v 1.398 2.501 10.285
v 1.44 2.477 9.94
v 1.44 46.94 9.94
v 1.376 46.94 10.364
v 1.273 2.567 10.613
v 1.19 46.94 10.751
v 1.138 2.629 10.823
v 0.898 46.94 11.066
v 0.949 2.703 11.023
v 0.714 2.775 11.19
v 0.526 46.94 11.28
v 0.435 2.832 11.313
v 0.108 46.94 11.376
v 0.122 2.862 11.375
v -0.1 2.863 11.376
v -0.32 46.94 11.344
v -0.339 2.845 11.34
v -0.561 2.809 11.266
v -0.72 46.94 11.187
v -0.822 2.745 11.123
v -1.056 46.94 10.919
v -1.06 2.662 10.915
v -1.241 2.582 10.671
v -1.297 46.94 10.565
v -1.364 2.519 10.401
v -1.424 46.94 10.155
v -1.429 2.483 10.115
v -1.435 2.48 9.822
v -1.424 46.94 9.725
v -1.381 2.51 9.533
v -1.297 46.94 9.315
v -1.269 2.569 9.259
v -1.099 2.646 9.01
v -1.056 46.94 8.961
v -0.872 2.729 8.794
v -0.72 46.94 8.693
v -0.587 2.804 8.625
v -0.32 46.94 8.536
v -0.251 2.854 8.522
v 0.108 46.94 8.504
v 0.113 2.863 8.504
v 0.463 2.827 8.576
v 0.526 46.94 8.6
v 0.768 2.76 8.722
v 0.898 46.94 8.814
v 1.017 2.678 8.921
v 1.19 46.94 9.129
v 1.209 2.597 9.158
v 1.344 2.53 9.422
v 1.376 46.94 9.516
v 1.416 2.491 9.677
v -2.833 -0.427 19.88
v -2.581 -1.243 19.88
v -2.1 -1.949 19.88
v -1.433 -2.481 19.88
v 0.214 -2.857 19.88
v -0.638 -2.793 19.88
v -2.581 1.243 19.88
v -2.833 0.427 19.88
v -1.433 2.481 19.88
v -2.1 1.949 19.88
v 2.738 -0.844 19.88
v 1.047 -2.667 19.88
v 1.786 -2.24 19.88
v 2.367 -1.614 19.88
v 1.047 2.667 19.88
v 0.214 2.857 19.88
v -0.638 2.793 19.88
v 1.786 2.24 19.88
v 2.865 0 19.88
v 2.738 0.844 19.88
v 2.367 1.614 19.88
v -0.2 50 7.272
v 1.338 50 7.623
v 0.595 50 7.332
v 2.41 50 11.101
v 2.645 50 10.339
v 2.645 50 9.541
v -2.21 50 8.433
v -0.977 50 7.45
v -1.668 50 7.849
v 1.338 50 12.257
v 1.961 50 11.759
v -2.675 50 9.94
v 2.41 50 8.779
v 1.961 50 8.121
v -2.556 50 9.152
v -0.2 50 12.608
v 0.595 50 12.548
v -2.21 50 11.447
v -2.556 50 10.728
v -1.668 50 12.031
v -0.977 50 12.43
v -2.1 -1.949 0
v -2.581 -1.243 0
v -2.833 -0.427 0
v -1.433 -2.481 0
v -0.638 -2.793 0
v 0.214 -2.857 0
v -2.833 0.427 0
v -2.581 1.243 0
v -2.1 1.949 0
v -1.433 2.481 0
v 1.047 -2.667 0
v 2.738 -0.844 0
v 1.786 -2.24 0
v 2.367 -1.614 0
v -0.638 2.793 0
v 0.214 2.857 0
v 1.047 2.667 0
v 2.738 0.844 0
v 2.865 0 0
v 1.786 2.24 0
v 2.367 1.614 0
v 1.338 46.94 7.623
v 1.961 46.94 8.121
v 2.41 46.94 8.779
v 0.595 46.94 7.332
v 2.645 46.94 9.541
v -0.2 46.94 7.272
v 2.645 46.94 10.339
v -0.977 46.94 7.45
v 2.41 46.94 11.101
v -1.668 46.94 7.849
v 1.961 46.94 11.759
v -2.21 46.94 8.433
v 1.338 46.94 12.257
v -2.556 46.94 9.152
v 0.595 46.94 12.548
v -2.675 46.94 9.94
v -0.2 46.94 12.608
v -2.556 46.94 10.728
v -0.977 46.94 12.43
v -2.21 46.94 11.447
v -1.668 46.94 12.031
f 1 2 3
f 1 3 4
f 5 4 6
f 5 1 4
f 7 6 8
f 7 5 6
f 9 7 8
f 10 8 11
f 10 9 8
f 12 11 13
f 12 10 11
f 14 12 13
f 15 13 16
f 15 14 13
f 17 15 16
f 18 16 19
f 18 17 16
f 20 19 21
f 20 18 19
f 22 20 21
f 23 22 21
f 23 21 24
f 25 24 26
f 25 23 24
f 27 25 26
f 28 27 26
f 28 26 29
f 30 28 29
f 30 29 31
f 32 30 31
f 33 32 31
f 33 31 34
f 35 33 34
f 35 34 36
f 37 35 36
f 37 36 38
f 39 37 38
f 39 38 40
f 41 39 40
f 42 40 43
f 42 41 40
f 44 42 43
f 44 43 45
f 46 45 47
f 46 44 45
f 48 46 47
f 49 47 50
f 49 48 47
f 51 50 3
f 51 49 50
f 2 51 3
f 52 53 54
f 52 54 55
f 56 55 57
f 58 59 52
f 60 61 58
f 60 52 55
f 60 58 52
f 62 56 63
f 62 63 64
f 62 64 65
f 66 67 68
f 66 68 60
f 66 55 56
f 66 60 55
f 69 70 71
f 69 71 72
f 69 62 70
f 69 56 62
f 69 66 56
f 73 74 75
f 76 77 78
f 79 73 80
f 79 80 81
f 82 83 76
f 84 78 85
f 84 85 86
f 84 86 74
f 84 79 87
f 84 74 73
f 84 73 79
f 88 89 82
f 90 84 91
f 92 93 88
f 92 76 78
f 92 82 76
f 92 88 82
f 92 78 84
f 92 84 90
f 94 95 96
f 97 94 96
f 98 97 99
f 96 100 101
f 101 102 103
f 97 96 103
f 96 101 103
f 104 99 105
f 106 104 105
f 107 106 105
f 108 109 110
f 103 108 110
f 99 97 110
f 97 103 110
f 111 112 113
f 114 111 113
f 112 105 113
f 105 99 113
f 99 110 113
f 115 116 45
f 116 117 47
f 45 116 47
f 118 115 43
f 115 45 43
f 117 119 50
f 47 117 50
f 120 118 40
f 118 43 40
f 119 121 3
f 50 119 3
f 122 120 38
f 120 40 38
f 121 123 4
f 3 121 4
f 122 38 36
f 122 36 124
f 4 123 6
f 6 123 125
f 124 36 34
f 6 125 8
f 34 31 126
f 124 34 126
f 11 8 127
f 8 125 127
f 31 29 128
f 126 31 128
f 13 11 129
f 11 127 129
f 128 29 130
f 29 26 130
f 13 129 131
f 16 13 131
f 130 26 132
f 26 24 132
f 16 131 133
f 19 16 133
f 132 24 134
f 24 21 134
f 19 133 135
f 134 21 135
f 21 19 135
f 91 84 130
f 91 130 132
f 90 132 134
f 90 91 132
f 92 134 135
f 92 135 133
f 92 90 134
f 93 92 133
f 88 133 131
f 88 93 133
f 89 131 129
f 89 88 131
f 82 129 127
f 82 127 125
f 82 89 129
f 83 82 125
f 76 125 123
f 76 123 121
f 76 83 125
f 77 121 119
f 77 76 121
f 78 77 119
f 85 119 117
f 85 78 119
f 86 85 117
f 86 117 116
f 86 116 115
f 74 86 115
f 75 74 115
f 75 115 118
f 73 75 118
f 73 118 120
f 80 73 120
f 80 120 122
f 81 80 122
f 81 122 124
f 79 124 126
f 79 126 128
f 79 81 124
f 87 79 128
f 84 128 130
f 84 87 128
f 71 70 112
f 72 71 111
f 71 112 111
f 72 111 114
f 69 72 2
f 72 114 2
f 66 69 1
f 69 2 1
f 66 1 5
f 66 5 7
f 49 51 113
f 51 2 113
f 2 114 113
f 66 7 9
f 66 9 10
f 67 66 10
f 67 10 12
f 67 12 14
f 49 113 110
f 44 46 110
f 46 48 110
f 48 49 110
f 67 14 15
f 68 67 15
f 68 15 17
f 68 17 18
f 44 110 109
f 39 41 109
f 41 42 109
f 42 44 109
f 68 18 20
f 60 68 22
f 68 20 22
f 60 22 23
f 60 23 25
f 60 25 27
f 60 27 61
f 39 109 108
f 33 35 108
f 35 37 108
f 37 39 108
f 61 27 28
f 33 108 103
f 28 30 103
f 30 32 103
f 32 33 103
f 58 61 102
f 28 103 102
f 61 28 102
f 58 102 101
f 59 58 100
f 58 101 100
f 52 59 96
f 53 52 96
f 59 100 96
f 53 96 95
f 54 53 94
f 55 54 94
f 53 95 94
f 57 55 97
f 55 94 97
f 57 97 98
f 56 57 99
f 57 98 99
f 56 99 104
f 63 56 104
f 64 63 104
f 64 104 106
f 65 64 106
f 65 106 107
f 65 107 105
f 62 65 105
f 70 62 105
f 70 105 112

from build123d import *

# Parameters (mm, degrees)
F0_R     = 2.865
F1_DEPTH = 19.88
F3_R     = 1.44
F4_DEPTH = 50
F5_R     = 2.675
F5_R_2   = 1.44
F6_DEPTH = 3.06


with BuildPart() as f1:
    # F0 (on Top) → F1 (new body)
    with BuildSketch(Plane.XY):
        Circle(F0_R)
    extrude(amount=F1_DEPTH)

    # F3 (on Front) → F4 (join)
    with BuildSketch(Plane.XZ):
        with Locations((0, 9.94)):
            Circle(F3_R)
    extrude(amount=-F4_DEPTH)

    # F5 (on face) → F6 (join)
    with BuildSketch(Plane(origin=(0, 50, 0), x_dir=(-1, 0, 0), z_dir=(0, 1, 0))):
        with Locations((0, 9.94)):
            Circle(F5_R)
        with Locations((0, 9.94)):
            Circle(F5_R_2, mode=Mode.SUBTRACT)
    extrude(amount=-F6_DEPTH)


solid = f1.part
